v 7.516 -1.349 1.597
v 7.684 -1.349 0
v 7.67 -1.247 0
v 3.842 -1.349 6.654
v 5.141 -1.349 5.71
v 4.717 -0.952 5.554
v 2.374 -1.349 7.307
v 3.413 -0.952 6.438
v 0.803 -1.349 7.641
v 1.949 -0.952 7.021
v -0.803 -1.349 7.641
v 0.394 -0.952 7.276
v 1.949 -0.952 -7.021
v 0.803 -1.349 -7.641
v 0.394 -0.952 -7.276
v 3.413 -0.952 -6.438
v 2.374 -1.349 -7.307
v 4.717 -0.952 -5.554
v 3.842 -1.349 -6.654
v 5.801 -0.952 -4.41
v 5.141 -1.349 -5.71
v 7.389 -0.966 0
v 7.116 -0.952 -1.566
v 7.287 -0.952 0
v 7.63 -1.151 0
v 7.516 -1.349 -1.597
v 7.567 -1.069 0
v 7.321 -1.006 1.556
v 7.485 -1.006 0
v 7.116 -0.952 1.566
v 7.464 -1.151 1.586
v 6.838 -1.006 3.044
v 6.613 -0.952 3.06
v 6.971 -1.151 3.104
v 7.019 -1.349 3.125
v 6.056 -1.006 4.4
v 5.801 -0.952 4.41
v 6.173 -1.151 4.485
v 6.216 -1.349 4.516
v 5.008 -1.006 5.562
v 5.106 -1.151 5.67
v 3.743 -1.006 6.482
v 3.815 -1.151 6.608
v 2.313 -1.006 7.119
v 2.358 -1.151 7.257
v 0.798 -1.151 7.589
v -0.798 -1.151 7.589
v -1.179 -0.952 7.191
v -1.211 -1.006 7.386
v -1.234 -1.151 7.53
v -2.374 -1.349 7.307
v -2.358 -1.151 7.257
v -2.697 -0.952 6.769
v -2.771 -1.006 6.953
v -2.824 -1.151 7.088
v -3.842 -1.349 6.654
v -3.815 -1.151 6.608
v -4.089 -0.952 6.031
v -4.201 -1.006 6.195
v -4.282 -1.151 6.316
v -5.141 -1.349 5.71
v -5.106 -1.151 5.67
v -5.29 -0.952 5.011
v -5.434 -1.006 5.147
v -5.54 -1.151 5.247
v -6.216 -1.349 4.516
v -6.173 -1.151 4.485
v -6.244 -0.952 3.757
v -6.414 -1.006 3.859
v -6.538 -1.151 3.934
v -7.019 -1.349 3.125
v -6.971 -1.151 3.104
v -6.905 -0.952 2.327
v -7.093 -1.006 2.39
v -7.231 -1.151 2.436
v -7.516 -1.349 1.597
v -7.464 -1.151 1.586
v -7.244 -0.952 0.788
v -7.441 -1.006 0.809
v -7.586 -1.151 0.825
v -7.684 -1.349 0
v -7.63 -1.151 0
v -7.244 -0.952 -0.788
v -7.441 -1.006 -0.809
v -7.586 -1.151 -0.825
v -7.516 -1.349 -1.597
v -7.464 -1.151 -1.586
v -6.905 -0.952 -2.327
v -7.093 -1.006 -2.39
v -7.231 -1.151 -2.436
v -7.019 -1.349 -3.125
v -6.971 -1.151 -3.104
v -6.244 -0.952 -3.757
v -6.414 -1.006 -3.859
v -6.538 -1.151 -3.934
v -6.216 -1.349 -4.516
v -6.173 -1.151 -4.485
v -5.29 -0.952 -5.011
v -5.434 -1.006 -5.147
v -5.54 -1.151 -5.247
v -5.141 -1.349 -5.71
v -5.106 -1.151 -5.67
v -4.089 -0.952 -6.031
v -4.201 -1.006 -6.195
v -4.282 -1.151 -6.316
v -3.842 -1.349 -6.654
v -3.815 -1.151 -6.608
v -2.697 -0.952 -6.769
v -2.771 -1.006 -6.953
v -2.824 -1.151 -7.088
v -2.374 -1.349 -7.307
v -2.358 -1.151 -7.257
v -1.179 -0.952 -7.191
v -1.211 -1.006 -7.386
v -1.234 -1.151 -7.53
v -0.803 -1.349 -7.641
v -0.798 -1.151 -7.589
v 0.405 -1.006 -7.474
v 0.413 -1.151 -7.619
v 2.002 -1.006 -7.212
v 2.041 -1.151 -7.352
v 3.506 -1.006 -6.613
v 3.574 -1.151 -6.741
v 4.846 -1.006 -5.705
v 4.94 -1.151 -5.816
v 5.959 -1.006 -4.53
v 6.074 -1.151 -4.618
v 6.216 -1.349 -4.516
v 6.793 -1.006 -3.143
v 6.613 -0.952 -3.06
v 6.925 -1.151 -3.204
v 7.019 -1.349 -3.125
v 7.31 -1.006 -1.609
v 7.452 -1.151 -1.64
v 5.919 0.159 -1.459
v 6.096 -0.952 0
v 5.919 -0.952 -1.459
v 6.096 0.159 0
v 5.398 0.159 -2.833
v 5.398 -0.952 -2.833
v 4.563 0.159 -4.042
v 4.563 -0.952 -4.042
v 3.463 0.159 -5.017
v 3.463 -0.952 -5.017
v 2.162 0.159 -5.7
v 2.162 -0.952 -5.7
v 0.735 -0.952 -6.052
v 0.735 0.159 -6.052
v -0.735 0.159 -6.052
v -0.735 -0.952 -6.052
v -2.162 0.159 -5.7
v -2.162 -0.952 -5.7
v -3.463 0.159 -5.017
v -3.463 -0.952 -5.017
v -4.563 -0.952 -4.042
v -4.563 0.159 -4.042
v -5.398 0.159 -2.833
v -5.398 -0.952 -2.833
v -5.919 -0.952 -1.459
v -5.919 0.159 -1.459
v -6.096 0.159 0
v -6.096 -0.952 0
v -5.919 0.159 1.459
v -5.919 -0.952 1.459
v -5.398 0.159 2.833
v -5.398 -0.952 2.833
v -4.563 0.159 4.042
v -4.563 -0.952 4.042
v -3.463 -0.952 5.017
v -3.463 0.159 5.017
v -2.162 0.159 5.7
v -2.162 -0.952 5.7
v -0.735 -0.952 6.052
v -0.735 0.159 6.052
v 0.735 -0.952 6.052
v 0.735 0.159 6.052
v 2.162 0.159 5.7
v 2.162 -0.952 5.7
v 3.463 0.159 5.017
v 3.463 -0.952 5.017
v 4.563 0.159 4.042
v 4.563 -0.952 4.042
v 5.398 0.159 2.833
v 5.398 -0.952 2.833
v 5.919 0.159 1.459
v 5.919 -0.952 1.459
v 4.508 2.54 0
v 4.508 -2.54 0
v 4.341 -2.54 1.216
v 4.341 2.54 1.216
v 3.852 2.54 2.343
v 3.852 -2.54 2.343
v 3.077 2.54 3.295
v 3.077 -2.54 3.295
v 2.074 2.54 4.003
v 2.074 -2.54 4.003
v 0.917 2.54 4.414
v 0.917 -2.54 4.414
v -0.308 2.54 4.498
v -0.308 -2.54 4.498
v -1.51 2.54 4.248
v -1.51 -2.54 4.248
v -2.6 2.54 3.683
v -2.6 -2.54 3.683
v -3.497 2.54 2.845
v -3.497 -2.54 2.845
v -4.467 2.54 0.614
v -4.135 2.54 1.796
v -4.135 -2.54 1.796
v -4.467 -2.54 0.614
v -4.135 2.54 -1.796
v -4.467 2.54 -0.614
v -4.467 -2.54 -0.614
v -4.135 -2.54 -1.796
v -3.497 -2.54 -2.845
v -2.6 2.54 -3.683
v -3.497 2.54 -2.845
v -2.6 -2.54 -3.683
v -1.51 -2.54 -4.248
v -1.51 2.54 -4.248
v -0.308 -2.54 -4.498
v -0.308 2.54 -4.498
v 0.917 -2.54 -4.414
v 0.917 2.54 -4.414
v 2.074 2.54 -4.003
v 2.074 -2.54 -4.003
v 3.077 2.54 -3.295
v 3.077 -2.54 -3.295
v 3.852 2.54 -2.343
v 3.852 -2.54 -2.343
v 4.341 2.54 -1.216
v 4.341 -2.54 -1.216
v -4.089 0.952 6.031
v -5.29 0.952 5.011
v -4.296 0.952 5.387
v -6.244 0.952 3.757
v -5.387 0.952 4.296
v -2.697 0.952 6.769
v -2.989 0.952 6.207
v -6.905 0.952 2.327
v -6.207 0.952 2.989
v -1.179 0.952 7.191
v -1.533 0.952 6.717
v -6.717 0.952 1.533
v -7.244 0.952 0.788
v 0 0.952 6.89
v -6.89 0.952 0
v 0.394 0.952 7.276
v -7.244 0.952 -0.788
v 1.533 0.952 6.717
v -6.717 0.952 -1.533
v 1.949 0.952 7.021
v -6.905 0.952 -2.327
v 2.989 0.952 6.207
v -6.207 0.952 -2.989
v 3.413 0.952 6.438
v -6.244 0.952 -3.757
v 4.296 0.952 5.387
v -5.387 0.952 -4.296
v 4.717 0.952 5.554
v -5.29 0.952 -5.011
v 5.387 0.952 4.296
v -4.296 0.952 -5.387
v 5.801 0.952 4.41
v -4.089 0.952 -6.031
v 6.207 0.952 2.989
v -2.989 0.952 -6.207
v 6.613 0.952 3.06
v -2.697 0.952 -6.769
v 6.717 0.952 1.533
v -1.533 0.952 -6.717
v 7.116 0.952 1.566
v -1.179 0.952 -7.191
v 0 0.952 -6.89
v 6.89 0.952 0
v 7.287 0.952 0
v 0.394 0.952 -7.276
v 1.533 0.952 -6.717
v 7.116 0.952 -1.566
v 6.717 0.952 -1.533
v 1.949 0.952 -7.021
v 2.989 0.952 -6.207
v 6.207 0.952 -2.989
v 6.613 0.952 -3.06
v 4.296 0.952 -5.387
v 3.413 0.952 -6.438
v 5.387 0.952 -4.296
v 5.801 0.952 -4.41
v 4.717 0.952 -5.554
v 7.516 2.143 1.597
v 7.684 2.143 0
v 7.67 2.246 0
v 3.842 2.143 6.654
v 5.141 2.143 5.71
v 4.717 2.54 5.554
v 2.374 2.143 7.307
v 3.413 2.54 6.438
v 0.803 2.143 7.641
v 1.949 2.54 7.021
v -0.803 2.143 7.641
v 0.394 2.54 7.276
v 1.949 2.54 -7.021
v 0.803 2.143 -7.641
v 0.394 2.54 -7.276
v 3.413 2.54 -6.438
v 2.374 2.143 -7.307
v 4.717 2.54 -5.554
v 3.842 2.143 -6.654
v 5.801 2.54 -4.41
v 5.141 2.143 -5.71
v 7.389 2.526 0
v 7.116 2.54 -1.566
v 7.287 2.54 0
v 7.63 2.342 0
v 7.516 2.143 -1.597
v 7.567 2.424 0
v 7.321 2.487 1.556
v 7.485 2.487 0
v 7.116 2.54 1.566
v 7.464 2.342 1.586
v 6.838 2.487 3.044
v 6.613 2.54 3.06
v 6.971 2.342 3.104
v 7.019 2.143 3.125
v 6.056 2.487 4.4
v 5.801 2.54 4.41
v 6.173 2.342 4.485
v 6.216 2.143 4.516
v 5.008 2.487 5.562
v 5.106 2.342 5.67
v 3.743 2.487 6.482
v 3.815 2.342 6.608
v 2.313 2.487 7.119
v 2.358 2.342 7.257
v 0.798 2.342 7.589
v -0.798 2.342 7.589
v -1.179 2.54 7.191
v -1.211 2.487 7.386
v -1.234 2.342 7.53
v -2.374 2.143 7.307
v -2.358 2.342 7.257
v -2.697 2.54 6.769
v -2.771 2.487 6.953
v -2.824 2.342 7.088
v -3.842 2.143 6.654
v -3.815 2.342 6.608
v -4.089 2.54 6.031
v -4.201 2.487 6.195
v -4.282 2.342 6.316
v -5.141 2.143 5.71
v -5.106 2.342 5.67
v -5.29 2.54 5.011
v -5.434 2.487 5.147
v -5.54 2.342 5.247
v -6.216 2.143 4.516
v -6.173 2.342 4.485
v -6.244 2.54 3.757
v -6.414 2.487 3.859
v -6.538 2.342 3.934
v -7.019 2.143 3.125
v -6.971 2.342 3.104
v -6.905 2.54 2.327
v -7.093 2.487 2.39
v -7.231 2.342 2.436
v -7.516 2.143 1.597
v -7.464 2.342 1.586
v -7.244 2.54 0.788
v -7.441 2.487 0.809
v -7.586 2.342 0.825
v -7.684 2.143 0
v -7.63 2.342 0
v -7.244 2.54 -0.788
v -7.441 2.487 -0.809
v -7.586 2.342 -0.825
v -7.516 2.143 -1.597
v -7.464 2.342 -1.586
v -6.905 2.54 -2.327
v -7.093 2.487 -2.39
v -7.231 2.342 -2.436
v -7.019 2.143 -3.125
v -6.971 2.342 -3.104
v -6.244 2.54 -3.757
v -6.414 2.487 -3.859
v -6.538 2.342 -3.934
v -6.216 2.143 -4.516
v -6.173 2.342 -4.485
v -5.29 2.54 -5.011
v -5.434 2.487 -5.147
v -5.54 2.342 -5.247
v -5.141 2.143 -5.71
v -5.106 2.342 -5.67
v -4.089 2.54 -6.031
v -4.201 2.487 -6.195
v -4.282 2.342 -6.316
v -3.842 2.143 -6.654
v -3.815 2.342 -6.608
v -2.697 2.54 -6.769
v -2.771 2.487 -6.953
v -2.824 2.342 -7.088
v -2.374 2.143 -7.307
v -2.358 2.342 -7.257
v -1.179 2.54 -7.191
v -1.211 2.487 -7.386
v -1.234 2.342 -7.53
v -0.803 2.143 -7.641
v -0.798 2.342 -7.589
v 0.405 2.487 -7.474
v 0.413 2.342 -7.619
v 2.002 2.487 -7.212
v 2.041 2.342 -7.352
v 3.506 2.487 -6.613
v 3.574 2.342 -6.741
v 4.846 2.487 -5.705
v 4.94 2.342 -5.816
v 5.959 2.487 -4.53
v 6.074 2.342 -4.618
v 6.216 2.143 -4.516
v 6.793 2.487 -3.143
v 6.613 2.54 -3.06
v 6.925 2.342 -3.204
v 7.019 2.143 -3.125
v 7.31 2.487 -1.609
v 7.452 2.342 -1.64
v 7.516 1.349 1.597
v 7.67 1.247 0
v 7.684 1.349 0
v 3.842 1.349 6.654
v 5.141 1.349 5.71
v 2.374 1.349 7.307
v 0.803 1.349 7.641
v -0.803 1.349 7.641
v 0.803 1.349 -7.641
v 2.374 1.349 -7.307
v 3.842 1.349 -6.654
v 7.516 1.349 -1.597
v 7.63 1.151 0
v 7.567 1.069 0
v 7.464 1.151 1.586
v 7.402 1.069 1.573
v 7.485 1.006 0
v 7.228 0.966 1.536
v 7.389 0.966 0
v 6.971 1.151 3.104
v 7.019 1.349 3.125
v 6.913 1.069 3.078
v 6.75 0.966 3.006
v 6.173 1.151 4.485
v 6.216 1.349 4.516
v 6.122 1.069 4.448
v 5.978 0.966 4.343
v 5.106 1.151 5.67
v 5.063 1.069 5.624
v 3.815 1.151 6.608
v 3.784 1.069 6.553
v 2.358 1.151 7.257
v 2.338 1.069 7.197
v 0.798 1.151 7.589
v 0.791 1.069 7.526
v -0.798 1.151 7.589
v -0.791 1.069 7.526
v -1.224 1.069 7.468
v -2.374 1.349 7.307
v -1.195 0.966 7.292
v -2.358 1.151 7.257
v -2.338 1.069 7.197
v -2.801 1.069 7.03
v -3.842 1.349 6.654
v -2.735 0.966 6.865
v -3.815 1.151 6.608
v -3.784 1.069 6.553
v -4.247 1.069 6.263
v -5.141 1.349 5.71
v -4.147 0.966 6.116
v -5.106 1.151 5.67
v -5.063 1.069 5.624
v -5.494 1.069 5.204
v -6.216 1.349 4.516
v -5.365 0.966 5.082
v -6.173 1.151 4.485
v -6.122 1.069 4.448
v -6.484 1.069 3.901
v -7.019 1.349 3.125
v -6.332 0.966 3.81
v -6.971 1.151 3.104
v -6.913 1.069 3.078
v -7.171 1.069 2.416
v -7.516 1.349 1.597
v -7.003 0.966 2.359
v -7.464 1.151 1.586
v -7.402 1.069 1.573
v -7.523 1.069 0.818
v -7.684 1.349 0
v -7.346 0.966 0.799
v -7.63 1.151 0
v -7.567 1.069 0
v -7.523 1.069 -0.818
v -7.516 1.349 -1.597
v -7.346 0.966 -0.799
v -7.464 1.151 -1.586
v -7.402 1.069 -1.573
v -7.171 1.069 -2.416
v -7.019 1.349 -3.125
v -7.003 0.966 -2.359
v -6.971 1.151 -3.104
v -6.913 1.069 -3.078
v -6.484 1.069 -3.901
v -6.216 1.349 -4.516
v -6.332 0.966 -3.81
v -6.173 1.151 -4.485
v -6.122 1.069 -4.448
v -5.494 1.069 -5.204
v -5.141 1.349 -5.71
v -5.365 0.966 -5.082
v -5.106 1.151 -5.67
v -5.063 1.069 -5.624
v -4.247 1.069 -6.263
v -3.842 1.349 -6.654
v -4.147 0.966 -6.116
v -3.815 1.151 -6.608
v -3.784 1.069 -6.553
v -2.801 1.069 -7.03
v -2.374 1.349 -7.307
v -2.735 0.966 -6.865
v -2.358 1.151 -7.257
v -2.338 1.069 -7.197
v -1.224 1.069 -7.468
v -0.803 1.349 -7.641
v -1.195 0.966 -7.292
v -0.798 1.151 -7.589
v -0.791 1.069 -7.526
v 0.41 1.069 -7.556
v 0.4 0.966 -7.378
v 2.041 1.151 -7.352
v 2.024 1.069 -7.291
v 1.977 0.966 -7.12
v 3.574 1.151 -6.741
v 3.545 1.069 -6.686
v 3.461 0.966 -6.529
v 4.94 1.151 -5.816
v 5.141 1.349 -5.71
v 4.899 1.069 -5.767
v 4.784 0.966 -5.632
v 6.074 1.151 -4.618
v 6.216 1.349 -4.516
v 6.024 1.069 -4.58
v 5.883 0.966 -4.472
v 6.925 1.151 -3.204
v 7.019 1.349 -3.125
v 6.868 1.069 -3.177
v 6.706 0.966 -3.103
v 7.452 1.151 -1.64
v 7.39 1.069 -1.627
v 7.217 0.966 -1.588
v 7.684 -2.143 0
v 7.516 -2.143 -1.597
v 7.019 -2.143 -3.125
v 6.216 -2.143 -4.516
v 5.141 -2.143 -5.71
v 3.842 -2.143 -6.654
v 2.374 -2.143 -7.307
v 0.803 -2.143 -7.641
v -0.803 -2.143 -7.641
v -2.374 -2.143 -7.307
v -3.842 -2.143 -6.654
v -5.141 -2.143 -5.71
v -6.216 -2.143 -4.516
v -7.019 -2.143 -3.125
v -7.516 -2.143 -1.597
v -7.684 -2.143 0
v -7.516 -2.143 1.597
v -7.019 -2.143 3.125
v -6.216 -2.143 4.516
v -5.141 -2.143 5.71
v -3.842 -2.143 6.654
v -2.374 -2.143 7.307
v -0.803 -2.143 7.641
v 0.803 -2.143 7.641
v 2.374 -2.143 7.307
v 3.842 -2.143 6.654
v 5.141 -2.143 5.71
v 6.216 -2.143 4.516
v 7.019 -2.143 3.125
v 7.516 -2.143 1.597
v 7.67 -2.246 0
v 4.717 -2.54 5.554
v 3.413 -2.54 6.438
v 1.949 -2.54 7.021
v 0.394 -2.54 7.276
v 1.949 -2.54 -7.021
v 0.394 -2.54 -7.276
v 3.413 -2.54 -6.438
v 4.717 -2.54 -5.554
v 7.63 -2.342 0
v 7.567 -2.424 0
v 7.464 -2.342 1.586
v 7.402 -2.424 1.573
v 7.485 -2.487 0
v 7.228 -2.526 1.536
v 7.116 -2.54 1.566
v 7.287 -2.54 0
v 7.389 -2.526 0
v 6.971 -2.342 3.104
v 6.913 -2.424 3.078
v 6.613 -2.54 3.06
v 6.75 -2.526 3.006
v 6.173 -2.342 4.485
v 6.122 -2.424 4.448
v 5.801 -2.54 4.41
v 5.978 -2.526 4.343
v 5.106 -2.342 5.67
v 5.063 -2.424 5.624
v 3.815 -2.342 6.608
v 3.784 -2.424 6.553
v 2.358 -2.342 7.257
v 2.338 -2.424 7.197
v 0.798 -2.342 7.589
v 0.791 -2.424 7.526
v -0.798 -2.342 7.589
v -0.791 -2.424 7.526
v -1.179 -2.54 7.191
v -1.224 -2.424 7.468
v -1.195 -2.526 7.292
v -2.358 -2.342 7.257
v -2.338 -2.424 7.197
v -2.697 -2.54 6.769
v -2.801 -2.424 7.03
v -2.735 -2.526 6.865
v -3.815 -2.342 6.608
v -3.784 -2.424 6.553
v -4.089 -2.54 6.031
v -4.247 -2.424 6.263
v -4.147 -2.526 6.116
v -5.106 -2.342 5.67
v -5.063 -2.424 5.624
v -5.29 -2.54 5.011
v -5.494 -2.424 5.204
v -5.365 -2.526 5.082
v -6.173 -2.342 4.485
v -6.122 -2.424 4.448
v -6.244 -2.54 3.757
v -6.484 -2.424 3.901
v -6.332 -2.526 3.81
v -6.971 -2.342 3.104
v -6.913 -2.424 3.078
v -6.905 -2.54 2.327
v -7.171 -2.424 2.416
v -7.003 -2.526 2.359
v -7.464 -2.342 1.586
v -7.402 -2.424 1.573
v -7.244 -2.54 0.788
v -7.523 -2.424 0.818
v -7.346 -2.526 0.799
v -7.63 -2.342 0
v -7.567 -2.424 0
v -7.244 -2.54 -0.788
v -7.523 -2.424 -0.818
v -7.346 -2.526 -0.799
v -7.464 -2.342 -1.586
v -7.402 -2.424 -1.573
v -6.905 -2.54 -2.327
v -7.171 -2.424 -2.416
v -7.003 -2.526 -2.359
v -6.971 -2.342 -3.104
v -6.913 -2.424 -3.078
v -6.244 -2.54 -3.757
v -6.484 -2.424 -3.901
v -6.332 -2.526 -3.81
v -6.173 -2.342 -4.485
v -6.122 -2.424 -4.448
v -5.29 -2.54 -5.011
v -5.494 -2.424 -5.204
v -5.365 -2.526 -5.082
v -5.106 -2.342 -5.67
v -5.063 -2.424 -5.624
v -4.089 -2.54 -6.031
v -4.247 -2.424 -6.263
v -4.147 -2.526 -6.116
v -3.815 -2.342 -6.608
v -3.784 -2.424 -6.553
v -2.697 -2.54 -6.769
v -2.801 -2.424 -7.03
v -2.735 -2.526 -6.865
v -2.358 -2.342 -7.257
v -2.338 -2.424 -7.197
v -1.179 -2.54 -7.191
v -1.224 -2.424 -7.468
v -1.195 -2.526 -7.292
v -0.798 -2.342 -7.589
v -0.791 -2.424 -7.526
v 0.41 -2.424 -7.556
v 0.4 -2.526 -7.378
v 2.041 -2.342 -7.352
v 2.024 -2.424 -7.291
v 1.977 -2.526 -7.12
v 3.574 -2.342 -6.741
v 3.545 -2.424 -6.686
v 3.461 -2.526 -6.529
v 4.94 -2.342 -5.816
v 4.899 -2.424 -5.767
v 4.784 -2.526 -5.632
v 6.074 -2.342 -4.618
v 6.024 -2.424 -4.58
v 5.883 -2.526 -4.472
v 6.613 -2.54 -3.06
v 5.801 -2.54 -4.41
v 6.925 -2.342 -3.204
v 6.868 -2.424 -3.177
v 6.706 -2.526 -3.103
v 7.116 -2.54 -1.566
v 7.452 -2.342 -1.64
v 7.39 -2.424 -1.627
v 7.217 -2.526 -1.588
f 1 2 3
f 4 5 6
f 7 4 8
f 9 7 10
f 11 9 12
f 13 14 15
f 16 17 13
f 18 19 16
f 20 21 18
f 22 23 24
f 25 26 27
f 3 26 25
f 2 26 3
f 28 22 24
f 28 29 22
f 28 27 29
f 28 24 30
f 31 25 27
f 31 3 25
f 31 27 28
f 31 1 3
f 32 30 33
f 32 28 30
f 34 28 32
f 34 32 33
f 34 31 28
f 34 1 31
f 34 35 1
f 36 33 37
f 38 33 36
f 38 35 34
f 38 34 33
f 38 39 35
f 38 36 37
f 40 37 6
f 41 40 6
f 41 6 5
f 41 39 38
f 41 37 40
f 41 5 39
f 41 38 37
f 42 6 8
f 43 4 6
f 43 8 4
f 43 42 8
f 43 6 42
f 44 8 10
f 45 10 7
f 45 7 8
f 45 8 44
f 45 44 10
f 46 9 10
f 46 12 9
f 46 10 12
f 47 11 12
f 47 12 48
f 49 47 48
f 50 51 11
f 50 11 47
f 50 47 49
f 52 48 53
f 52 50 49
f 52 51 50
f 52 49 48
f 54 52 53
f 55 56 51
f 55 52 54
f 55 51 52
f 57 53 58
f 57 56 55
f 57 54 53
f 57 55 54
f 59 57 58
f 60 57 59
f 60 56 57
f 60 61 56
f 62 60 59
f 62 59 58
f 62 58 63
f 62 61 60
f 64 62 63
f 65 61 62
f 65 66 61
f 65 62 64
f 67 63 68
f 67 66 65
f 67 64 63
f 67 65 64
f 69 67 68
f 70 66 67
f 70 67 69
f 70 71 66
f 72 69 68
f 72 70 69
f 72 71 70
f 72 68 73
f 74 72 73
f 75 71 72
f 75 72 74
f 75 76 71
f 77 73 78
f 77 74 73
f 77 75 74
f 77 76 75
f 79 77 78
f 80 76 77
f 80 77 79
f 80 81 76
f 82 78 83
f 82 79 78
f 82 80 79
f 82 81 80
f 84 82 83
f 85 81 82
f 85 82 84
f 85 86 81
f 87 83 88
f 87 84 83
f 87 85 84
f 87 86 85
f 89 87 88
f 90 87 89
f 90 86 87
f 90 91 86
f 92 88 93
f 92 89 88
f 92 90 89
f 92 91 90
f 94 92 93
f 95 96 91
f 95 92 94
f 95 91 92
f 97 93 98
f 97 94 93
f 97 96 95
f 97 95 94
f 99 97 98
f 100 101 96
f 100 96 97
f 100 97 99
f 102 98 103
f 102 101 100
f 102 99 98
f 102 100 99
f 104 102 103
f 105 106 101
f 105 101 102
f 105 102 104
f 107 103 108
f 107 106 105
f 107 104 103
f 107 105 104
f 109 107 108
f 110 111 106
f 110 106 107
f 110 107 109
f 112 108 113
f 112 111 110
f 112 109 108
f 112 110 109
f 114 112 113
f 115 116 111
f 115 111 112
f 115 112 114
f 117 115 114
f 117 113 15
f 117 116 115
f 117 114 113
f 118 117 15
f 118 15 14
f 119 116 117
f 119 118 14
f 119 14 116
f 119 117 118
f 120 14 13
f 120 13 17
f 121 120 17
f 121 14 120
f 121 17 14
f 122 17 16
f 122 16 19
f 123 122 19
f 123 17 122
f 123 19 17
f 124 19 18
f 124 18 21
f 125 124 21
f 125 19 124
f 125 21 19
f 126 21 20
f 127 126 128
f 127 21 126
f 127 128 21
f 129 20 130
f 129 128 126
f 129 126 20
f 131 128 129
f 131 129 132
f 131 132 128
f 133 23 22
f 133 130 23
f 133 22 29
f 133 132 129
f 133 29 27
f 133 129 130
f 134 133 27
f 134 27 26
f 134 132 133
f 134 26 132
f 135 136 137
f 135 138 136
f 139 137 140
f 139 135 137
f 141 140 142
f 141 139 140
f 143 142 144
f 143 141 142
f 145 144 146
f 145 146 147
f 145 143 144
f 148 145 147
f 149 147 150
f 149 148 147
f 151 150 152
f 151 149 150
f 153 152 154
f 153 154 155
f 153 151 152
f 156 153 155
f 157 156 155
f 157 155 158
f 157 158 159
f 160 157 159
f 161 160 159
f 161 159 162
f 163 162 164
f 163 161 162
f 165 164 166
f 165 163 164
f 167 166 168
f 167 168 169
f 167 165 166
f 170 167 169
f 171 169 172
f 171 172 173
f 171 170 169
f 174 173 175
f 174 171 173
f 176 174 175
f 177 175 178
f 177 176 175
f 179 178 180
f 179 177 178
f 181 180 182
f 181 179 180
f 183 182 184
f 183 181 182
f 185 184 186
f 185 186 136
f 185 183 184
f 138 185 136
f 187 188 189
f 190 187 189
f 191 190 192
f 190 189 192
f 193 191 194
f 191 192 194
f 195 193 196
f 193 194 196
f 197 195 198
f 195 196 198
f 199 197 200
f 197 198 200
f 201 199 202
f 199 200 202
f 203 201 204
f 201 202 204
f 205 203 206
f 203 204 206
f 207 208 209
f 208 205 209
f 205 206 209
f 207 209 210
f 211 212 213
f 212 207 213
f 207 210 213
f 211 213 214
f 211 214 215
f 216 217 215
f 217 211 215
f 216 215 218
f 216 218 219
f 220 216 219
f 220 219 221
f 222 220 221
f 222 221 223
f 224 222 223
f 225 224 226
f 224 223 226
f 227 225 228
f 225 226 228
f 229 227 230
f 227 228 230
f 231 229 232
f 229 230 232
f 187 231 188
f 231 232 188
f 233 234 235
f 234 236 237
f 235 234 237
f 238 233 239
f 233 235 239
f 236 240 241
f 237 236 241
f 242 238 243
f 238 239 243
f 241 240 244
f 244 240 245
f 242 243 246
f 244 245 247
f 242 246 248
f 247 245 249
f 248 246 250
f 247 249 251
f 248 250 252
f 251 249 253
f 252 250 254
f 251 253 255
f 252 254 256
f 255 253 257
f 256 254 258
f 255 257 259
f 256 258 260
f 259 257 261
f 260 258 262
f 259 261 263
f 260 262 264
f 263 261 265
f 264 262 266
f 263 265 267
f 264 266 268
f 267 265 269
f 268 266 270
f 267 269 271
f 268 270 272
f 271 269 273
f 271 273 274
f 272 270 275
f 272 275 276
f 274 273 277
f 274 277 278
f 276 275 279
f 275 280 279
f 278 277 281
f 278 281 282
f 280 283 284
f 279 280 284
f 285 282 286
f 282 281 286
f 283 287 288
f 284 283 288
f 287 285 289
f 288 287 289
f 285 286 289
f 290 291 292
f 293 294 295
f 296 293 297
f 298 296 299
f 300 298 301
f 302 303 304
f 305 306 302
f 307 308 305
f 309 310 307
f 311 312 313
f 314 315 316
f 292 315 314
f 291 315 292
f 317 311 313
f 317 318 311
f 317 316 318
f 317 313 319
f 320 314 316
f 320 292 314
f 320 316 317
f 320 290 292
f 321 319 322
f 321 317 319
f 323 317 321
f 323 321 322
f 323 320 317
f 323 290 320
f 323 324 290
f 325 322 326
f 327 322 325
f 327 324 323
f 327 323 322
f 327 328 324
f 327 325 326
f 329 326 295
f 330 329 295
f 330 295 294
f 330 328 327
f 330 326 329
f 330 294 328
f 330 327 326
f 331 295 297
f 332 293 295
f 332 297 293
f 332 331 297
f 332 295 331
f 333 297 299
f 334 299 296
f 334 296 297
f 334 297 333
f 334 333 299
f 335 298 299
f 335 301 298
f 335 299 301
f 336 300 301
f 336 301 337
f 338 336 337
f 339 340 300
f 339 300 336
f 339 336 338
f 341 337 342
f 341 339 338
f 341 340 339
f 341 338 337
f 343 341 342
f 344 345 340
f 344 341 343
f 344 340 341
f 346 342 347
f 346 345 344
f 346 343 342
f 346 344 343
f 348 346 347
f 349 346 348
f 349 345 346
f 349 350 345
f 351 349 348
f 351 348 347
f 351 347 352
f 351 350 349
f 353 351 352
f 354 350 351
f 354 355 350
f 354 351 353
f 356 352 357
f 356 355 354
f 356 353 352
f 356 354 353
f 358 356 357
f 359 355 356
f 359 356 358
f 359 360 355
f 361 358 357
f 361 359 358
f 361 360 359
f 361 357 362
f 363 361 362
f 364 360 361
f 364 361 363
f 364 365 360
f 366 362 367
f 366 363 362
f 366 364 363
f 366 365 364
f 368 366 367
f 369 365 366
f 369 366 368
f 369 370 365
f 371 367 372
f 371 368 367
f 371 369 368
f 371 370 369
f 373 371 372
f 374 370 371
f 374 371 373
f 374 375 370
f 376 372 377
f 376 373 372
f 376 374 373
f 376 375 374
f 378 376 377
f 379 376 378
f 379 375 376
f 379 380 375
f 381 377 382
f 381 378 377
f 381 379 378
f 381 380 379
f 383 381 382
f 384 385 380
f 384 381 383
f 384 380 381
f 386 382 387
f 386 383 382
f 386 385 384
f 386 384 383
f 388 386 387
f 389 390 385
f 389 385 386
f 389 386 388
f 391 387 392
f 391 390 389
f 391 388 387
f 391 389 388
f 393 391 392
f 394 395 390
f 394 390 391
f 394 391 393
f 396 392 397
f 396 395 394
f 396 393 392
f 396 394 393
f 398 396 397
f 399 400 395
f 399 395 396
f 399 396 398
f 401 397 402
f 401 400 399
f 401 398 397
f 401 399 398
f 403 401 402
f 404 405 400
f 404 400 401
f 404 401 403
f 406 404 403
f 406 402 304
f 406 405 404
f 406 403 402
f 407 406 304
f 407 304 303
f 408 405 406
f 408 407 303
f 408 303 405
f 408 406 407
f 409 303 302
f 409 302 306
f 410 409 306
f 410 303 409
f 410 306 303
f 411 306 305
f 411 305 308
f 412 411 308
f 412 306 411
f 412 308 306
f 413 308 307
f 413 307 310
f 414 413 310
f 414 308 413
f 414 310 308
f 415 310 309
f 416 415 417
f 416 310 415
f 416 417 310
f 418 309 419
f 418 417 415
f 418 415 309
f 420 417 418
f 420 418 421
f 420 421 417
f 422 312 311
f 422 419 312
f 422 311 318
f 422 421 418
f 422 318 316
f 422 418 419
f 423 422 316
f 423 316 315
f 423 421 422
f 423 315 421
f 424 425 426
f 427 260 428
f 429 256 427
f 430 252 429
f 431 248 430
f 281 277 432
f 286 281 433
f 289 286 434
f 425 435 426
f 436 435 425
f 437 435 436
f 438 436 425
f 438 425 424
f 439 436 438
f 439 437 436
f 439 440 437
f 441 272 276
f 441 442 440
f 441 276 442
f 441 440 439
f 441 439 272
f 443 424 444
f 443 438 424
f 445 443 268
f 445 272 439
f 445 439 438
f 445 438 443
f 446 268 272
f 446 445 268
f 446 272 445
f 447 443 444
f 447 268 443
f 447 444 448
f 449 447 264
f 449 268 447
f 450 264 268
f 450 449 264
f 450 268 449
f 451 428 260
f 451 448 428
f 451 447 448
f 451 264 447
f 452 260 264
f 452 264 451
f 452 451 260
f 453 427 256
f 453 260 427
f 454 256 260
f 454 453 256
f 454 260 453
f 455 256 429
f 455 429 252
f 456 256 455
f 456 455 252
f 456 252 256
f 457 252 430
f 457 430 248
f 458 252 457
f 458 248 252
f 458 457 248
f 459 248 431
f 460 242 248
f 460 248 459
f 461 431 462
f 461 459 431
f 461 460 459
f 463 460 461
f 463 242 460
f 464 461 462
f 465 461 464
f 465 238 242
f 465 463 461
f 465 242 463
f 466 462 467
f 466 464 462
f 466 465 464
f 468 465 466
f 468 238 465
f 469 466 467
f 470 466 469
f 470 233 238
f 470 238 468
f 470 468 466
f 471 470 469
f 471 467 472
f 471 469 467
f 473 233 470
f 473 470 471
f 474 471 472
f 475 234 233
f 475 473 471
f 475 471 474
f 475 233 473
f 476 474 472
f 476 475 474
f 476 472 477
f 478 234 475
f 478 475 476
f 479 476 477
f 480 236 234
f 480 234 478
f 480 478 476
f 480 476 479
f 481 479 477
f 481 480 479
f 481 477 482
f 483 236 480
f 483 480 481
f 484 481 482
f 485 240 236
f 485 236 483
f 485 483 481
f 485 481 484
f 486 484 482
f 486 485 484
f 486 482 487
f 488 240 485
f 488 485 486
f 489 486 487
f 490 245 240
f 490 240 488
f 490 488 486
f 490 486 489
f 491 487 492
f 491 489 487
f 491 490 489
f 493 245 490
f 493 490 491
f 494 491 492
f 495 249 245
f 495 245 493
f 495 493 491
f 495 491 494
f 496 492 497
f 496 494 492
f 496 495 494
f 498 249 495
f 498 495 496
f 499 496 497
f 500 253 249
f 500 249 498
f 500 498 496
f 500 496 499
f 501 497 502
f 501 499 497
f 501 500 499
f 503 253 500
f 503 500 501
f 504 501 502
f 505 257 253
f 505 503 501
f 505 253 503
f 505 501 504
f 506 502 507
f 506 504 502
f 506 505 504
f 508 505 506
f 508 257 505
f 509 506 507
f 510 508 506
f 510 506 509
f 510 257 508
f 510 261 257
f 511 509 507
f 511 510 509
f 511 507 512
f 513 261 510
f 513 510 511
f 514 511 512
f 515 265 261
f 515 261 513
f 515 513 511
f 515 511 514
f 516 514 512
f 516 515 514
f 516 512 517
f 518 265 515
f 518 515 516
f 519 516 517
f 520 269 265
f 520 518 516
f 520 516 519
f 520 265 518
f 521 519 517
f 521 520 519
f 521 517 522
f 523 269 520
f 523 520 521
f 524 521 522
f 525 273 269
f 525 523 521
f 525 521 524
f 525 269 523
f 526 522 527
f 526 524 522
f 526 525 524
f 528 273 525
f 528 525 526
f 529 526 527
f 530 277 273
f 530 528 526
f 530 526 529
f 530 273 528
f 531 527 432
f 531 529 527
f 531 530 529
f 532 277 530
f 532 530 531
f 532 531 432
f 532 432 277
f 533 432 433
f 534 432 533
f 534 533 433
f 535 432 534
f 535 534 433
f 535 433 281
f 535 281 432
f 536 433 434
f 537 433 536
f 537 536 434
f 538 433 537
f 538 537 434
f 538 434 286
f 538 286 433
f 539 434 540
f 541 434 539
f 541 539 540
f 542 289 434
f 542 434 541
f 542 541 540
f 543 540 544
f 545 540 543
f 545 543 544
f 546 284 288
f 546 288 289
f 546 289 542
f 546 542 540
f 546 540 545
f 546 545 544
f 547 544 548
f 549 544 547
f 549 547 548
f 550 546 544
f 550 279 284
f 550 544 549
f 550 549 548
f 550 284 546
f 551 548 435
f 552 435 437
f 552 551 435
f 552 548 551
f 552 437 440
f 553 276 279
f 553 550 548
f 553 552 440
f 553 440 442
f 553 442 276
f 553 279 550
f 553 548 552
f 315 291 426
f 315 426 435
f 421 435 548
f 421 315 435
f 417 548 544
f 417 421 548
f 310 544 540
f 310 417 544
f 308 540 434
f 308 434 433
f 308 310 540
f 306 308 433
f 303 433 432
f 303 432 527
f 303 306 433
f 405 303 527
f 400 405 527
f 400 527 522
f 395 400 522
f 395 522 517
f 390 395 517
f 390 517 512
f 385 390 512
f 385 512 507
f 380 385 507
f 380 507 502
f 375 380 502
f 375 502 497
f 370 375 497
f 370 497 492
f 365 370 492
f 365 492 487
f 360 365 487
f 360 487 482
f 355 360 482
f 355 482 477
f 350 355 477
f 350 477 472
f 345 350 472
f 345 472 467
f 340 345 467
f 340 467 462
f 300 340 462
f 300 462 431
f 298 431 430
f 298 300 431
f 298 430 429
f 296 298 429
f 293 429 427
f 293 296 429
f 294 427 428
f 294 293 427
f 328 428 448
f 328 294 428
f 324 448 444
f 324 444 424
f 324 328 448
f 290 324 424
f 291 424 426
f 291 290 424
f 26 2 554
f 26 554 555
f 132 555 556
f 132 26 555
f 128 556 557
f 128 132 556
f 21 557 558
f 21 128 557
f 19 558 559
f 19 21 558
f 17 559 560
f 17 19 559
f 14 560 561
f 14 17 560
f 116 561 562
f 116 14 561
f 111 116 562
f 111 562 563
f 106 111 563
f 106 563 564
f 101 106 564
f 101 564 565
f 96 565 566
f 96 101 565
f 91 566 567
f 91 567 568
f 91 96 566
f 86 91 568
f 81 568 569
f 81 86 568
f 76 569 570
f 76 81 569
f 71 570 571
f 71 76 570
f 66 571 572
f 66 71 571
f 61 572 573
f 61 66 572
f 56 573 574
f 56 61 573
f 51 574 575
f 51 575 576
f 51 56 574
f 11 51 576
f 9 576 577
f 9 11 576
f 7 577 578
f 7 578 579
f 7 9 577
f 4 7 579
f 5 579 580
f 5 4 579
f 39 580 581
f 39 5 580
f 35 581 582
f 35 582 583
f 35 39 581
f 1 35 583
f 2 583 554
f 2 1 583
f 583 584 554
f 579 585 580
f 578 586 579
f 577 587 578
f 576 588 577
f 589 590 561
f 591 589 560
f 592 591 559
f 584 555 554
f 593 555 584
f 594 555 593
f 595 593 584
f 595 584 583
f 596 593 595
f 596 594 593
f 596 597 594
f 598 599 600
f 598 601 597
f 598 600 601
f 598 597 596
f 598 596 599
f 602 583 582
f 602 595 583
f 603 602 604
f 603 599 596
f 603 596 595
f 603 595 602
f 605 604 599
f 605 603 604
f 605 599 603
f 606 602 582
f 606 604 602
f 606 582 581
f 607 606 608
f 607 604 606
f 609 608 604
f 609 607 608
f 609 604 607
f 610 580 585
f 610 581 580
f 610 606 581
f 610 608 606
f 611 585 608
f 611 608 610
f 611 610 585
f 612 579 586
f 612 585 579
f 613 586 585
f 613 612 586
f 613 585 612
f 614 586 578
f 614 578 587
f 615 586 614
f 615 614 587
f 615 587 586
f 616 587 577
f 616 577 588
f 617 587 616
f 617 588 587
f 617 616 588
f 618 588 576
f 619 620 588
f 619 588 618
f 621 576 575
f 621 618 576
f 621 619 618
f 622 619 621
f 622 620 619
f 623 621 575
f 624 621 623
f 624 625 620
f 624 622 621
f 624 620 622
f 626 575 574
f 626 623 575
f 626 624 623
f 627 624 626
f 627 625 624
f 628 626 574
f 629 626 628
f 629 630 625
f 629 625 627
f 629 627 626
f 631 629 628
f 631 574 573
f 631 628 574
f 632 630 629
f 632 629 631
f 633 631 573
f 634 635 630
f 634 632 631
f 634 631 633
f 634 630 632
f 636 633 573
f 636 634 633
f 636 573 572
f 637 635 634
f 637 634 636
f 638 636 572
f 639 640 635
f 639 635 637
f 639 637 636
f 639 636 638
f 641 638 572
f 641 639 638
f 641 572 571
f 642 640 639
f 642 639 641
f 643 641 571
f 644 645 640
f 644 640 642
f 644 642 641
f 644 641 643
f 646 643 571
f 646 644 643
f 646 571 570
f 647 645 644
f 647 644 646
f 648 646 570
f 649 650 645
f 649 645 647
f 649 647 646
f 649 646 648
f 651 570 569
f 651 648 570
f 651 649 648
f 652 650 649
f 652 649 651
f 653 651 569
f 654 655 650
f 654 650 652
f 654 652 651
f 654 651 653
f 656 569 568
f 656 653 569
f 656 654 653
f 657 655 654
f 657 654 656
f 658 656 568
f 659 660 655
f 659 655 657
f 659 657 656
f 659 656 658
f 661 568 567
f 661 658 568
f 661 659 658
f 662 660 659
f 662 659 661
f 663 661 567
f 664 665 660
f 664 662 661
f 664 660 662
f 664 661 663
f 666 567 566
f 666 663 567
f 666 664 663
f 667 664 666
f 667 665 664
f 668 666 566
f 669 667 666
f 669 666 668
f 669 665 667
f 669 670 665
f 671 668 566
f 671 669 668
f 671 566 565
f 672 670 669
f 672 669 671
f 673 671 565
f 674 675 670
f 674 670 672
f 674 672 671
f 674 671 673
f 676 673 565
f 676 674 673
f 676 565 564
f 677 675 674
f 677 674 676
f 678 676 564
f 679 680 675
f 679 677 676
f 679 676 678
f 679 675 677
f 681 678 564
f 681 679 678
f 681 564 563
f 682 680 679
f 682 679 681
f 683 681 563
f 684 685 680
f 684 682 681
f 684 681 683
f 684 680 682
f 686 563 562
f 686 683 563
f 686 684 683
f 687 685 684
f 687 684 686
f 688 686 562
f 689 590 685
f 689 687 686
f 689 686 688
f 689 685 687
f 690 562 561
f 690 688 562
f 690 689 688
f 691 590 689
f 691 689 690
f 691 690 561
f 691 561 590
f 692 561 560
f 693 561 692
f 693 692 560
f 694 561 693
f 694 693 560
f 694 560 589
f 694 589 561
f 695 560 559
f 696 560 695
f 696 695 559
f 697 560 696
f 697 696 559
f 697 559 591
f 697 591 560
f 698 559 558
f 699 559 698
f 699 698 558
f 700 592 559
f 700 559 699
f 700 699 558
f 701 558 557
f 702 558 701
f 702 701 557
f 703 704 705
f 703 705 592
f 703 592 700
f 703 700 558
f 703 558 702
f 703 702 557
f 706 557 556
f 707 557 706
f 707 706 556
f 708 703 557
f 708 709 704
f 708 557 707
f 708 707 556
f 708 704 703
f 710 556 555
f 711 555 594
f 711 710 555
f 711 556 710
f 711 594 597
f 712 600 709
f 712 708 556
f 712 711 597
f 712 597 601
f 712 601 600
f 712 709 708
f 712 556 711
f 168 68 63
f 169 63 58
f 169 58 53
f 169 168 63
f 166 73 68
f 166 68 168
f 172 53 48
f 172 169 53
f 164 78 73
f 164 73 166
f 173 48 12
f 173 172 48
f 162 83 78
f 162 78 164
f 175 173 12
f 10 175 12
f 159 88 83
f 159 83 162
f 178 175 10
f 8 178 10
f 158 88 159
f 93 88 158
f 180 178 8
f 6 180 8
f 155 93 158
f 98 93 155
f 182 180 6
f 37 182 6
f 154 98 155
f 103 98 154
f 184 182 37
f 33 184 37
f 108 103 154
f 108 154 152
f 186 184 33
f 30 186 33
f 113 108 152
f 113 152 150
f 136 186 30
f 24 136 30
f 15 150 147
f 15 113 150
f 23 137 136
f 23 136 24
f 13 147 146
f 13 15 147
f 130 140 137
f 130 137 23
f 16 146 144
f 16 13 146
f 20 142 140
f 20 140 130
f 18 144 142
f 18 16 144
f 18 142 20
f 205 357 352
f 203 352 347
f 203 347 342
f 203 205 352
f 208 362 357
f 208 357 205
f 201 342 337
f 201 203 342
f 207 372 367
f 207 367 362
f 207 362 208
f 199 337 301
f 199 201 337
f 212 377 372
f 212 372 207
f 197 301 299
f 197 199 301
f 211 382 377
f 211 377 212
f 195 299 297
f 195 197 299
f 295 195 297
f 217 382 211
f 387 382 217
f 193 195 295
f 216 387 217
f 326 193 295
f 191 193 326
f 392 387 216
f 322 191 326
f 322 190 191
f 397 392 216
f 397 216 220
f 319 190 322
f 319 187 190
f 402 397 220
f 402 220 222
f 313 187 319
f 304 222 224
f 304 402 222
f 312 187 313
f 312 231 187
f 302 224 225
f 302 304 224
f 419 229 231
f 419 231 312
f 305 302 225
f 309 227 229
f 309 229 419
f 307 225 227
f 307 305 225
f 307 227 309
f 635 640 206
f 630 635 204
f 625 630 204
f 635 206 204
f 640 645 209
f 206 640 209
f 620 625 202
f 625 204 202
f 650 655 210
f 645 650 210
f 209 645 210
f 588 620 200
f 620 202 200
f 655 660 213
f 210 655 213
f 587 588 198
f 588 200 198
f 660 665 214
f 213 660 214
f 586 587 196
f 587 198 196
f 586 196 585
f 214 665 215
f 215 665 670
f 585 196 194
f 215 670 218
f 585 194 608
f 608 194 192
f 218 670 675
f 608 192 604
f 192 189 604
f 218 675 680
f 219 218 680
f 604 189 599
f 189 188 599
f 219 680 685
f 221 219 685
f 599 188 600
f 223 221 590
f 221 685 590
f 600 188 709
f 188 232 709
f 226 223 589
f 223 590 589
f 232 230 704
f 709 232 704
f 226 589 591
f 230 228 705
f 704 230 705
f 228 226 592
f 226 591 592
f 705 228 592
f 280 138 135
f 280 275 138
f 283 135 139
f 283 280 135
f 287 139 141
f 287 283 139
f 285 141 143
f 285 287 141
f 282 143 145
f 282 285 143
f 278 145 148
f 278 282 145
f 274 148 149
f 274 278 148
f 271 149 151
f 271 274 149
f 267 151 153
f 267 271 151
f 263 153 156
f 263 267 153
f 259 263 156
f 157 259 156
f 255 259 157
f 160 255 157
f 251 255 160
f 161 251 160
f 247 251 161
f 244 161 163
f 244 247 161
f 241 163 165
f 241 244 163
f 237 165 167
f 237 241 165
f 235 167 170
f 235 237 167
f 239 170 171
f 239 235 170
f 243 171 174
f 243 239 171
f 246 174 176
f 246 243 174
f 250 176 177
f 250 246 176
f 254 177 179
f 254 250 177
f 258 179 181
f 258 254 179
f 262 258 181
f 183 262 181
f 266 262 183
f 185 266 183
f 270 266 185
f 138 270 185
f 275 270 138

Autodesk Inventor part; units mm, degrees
ref_plane "YZ Plane" through (0, 0, 0) normal (1, 0, 0) x (0, 1, 0)
ref_plane "XZ Plane" through (0, 0, 0) normal (0, 1, 0) x (-1, 0, 0)
ref_plane "XY Plane" through (0, 0, 0) normal (0, 0, 1) x (1, 0, 0)
sketch "Sketch1" plane through (0, 0, 0) normal (0, 0, 1) x (1, 0, 0)
  line L0 (4.5085, 2.54) -> (4.5085, -2.54)
  line L1 (4.5085, -2.54) -> (7.6835, -2.54)
  line L2 (7.6835, -2.54) -> (7.6835, -0.9525)
  line L3 (7.6835, -0.9525) -> (6.096, -0.9525)
  line L4 (6.096, -0.9525) -> (6.096, 0.9525)
  line L5 (6.096, 0.9525) -> (7.6835, 0.9525)
  line L6 (7.6835, 0.9525) -> (7.6835, 2.54)
  line L7 (7.6835, 2.54) -> (4.5085, 2.54)
  line L8 (0, 0) -> (0, 2.54) construction
  point P0 (4.5085, 0)
  point P1 (6.096, 0)
  dimension "d0" = 6.096
  dimension "d1" = 1.905
  dimension "d2" = 5.08
  dimension "d3" = 1.5875
  dimension "d4" = 1.5875
  dimension "d5" = 1.5875
revolve "Revolution1" add sketch "Sketch1" angle 360 about axis through (0, 0, 0) along (0, 1, 0)
fillet "Fillet1" radius 0.3969 4 edges at (-7.6835, -0.9525, 0) (-7.6835, -2.54, 0) (-7.6835, 0.9525, 0) (-7.6835, 2.54, 0)
chamfer "Chamfer1" distance 0.7937 angle 45 1 edges at (-6.096, 0.9525, 0) measured on face at (6.7601, 0.9525, 1.0676)
equation "\"d4\" = d3"
properties part number ".5 tpu grommet" material "Rubber, Black"
